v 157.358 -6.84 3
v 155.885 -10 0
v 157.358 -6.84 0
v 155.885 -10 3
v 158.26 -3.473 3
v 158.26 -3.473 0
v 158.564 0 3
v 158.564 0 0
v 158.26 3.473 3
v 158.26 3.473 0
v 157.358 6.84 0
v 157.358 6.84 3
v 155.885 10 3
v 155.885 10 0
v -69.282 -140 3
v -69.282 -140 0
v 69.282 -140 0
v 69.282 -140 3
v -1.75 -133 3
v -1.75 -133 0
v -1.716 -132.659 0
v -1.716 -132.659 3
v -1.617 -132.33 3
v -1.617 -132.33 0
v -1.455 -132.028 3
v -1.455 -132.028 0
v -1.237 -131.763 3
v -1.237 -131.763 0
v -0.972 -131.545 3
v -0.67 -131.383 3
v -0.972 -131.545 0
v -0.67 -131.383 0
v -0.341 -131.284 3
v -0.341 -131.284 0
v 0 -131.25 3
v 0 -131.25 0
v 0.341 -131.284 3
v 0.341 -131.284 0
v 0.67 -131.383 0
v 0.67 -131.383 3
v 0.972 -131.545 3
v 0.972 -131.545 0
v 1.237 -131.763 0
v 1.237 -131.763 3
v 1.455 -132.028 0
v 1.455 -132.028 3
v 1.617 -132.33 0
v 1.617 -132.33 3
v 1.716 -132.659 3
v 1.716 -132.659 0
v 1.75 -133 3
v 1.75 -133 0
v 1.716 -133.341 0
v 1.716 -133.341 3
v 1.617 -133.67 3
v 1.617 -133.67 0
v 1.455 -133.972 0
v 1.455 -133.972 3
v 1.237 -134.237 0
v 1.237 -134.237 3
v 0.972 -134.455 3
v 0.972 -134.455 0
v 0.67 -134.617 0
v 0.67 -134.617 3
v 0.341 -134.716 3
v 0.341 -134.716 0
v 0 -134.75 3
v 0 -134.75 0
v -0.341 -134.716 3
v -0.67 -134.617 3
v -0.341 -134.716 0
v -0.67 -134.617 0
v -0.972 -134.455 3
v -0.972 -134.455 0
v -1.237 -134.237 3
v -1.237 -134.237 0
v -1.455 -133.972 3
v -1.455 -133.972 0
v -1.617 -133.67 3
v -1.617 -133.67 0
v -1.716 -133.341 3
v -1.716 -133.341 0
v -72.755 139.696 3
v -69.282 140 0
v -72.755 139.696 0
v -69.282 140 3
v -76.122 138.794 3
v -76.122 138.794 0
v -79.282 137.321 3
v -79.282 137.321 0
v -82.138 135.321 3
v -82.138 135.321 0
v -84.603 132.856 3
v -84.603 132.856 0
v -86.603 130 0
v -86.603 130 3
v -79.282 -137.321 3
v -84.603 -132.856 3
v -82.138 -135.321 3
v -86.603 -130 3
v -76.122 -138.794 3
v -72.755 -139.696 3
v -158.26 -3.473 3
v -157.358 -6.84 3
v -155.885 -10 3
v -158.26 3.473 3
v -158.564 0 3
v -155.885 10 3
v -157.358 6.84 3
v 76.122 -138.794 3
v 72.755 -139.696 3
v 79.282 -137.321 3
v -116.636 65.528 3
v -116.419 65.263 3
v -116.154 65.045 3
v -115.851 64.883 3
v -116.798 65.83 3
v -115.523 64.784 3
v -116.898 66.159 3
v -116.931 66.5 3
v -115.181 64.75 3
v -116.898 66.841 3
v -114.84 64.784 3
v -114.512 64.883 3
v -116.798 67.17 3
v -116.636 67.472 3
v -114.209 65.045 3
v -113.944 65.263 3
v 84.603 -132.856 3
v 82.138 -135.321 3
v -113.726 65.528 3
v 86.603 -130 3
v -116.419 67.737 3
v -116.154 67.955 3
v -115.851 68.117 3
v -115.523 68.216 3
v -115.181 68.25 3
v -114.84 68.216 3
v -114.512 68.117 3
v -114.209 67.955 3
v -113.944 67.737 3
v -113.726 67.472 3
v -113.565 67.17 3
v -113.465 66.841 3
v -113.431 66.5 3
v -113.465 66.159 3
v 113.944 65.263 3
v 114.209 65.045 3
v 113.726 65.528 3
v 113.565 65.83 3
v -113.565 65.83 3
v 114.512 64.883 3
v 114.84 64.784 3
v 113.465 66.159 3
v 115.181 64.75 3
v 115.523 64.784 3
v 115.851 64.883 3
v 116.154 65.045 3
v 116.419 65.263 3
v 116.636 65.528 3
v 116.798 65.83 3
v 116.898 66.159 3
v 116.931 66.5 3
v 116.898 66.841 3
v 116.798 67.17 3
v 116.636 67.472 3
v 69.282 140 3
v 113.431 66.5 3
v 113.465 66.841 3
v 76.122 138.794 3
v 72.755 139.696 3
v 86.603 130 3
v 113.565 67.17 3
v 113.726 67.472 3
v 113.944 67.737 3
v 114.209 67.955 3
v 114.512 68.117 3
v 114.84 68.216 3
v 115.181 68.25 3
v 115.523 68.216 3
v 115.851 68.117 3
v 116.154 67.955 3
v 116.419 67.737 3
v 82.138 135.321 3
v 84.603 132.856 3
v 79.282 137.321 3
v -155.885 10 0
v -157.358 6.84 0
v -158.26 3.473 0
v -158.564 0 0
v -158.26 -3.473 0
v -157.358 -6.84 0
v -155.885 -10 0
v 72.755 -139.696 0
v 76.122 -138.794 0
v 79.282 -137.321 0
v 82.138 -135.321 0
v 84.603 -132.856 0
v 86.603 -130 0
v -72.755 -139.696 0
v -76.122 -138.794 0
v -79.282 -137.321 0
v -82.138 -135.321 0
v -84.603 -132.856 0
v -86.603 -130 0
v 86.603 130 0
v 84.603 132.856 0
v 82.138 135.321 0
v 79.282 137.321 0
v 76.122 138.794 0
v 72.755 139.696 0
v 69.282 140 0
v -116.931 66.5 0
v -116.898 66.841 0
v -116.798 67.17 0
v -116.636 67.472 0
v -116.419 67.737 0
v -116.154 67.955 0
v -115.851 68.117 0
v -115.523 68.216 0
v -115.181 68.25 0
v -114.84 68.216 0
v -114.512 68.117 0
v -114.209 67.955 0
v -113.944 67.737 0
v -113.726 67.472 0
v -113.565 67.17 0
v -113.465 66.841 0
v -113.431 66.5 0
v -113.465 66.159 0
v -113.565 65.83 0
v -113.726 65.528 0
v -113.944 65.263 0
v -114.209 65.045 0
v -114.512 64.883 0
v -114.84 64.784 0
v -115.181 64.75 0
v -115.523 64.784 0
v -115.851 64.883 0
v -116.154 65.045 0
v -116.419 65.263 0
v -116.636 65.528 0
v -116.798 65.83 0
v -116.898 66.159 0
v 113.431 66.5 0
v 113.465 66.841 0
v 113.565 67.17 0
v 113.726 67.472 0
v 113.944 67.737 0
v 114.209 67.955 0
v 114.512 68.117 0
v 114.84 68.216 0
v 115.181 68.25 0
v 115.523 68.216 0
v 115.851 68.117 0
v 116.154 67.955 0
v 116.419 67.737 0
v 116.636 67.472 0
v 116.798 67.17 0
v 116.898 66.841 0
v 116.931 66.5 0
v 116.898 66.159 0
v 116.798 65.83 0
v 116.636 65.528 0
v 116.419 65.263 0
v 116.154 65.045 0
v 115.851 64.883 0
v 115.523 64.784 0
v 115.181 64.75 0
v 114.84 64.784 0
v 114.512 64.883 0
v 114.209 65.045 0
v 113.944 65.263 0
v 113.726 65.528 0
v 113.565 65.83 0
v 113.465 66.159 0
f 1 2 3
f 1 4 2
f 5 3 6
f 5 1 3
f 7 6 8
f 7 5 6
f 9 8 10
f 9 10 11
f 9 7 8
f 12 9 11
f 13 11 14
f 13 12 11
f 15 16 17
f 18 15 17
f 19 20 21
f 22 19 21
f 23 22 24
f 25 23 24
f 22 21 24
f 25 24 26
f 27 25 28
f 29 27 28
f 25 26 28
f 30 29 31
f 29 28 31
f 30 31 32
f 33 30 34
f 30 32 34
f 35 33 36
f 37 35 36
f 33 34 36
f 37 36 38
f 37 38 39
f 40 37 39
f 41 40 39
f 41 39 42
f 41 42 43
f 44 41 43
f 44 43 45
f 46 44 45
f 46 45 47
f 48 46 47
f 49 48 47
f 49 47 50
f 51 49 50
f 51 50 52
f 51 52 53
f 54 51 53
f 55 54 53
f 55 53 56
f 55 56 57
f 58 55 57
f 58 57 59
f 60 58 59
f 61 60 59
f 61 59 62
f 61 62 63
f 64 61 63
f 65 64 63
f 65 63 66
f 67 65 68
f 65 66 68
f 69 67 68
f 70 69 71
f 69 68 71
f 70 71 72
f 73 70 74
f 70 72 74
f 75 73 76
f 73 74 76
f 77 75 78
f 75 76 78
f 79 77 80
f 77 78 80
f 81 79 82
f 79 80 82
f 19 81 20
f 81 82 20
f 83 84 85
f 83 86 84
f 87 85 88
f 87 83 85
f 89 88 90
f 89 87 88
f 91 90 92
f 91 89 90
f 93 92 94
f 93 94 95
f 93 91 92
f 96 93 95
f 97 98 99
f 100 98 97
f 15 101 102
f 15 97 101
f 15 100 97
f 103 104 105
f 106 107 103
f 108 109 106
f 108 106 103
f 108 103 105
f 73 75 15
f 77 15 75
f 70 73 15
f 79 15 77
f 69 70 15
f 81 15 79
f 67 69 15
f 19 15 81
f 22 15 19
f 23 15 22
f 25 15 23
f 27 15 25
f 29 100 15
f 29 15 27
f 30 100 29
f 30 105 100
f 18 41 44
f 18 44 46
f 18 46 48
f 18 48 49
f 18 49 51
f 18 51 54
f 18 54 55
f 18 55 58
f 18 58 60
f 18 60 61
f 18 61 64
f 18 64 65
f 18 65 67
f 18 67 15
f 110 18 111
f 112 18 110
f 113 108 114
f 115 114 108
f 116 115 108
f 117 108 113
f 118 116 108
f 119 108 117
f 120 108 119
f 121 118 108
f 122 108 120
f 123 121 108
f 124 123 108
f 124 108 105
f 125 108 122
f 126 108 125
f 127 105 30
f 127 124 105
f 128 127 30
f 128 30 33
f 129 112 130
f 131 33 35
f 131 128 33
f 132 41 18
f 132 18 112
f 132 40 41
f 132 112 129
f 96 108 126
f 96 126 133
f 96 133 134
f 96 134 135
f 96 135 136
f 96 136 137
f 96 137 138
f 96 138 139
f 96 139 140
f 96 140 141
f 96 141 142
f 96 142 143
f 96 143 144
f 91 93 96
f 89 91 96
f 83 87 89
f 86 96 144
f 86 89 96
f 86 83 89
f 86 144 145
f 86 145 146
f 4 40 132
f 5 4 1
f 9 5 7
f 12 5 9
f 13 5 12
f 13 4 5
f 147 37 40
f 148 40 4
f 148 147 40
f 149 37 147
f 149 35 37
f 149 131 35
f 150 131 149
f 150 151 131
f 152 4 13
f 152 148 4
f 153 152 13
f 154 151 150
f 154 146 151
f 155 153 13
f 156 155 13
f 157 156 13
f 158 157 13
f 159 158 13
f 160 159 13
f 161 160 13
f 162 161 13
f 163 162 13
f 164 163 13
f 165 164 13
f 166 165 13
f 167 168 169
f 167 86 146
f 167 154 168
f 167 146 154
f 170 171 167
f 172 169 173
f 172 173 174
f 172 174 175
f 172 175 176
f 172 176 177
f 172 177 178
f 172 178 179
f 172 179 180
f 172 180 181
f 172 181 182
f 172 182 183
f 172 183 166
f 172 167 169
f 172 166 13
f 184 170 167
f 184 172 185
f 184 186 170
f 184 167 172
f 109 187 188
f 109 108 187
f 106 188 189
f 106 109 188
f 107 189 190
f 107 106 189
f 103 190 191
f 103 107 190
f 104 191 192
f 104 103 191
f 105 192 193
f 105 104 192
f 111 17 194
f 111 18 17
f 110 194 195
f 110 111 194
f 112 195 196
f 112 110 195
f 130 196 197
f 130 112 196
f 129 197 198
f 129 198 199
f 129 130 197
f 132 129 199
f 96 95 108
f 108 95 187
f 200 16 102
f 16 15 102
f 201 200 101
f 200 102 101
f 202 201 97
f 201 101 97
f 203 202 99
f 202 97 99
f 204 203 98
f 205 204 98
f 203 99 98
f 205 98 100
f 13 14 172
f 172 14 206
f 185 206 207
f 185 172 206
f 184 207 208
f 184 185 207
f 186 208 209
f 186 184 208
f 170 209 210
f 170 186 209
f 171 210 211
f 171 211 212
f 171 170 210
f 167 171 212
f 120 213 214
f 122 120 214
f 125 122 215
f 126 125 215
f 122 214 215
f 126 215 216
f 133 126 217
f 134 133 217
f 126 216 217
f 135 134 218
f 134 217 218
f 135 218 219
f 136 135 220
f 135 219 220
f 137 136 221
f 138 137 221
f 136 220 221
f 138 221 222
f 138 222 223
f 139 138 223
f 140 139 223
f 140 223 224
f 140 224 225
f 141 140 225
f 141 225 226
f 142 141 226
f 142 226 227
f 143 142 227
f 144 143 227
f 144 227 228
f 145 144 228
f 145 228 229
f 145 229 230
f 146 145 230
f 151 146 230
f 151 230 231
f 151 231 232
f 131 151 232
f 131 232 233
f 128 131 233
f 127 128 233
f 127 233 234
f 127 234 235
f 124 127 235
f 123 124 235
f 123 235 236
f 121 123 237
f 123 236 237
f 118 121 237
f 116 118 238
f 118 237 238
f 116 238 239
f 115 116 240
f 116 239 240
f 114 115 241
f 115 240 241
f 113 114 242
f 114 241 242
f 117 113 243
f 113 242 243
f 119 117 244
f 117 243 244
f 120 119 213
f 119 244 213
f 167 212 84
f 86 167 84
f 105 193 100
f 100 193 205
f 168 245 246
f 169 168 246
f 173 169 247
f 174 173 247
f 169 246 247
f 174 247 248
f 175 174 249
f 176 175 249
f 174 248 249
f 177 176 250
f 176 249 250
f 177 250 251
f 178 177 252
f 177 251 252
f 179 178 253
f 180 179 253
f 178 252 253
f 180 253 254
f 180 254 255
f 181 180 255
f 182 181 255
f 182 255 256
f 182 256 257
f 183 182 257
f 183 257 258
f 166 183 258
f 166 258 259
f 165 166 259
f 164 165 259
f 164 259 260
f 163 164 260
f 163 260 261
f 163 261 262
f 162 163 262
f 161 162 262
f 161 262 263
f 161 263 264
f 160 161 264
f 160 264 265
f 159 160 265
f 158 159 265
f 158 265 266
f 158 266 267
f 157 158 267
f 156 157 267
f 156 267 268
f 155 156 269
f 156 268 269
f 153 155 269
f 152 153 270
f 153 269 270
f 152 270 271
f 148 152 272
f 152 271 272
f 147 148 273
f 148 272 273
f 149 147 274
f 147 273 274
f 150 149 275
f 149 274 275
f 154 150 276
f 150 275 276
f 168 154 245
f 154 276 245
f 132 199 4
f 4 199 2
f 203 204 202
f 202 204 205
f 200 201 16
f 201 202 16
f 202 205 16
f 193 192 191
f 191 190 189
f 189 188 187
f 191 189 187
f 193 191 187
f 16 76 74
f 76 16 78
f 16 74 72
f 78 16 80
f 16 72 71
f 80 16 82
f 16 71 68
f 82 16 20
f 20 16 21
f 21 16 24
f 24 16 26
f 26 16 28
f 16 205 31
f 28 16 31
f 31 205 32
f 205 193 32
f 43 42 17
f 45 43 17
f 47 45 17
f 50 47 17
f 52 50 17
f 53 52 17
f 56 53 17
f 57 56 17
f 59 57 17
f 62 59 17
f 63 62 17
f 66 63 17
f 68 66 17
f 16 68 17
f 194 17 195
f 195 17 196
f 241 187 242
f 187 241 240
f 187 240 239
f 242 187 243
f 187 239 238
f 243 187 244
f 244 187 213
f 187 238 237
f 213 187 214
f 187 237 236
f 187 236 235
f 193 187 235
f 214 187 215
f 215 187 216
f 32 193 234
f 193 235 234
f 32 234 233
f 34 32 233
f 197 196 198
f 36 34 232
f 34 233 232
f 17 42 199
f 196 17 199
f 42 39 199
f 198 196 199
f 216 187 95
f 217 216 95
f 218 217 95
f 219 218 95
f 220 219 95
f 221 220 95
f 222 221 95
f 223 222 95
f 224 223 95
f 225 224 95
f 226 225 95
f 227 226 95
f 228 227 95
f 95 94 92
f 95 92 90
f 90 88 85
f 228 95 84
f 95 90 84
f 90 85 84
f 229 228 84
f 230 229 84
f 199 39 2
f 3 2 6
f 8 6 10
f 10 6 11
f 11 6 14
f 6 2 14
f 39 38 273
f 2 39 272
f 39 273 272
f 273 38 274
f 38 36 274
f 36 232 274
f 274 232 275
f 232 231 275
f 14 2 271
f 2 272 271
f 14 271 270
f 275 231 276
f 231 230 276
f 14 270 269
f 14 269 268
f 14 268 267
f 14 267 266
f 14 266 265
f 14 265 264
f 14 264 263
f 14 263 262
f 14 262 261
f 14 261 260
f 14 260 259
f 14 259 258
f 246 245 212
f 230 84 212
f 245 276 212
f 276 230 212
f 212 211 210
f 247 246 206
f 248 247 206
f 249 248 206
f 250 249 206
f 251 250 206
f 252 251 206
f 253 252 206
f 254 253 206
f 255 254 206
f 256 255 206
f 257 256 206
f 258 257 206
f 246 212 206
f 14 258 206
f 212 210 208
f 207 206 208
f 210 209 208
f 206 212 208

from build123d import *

# Parameters (mm, degrees)
SALIENTE_EXTRUIR1_DEPTH = 3
REDONDEO1_R             = 20
CROQUIS2_R              = 1.75
CORTAR_EXTRUIR1_DEPTH   = 212.545651301


with BuildPart() as part:
    # Croquis1 → Saliente-Extruir1 (new body)
    with BuildSketch(Plane.XY):
        Polygon((-80.829037687, -140), (80.829037687, -140), (161.658075373, 0), (80.829037687, 140), (-80.829037687, 140), (-161.658075373, 0), align=None)
    extrude(amount=SALIENTE_EXTRUIR1_DEPTH)

    # Redondeo1
    redondeo1_edges = [part.edges().sort_by_distance(p)[0] for p in [
        (161.658075373, 0, 1.5),
        (80.829037687, -140, 1.5),
        (-80.829037687, -140, 1.5),
        (-161.658075373, 0, 1.5),
        (-80.829037687, 140, 1.5),
        (80.829037687, 140, 1.5),
    ]]
    fillet(redondeo1_edges, radius=REDONDEO1_R)

    # Croquis2 → Cortar-Extruir1 (cut, through all)
    with BuildSketch(Plane(origin=(0, 0, 0), x_dir=(1, 0, 0), z_dir=(0, 0, -1))):
        with Locations(Location((0, 133, 0), (0, 0, 180))):
            Circle(CROQUIS2_R)
        with Locations(Location((115.181378703, -66.5, 0), (0, 0, 180))):
            Circle(CROQUIS2_R)
        with Locations(Location((-115.181378703, -66.5, 0), (0, 0, 180))):
            Circle(CROQUIS2_R)
    extrude(amount=-CORTAR_EXTRUIR1_DEPTH, mode=Mode.SUBTRACT)


solid = part.part
